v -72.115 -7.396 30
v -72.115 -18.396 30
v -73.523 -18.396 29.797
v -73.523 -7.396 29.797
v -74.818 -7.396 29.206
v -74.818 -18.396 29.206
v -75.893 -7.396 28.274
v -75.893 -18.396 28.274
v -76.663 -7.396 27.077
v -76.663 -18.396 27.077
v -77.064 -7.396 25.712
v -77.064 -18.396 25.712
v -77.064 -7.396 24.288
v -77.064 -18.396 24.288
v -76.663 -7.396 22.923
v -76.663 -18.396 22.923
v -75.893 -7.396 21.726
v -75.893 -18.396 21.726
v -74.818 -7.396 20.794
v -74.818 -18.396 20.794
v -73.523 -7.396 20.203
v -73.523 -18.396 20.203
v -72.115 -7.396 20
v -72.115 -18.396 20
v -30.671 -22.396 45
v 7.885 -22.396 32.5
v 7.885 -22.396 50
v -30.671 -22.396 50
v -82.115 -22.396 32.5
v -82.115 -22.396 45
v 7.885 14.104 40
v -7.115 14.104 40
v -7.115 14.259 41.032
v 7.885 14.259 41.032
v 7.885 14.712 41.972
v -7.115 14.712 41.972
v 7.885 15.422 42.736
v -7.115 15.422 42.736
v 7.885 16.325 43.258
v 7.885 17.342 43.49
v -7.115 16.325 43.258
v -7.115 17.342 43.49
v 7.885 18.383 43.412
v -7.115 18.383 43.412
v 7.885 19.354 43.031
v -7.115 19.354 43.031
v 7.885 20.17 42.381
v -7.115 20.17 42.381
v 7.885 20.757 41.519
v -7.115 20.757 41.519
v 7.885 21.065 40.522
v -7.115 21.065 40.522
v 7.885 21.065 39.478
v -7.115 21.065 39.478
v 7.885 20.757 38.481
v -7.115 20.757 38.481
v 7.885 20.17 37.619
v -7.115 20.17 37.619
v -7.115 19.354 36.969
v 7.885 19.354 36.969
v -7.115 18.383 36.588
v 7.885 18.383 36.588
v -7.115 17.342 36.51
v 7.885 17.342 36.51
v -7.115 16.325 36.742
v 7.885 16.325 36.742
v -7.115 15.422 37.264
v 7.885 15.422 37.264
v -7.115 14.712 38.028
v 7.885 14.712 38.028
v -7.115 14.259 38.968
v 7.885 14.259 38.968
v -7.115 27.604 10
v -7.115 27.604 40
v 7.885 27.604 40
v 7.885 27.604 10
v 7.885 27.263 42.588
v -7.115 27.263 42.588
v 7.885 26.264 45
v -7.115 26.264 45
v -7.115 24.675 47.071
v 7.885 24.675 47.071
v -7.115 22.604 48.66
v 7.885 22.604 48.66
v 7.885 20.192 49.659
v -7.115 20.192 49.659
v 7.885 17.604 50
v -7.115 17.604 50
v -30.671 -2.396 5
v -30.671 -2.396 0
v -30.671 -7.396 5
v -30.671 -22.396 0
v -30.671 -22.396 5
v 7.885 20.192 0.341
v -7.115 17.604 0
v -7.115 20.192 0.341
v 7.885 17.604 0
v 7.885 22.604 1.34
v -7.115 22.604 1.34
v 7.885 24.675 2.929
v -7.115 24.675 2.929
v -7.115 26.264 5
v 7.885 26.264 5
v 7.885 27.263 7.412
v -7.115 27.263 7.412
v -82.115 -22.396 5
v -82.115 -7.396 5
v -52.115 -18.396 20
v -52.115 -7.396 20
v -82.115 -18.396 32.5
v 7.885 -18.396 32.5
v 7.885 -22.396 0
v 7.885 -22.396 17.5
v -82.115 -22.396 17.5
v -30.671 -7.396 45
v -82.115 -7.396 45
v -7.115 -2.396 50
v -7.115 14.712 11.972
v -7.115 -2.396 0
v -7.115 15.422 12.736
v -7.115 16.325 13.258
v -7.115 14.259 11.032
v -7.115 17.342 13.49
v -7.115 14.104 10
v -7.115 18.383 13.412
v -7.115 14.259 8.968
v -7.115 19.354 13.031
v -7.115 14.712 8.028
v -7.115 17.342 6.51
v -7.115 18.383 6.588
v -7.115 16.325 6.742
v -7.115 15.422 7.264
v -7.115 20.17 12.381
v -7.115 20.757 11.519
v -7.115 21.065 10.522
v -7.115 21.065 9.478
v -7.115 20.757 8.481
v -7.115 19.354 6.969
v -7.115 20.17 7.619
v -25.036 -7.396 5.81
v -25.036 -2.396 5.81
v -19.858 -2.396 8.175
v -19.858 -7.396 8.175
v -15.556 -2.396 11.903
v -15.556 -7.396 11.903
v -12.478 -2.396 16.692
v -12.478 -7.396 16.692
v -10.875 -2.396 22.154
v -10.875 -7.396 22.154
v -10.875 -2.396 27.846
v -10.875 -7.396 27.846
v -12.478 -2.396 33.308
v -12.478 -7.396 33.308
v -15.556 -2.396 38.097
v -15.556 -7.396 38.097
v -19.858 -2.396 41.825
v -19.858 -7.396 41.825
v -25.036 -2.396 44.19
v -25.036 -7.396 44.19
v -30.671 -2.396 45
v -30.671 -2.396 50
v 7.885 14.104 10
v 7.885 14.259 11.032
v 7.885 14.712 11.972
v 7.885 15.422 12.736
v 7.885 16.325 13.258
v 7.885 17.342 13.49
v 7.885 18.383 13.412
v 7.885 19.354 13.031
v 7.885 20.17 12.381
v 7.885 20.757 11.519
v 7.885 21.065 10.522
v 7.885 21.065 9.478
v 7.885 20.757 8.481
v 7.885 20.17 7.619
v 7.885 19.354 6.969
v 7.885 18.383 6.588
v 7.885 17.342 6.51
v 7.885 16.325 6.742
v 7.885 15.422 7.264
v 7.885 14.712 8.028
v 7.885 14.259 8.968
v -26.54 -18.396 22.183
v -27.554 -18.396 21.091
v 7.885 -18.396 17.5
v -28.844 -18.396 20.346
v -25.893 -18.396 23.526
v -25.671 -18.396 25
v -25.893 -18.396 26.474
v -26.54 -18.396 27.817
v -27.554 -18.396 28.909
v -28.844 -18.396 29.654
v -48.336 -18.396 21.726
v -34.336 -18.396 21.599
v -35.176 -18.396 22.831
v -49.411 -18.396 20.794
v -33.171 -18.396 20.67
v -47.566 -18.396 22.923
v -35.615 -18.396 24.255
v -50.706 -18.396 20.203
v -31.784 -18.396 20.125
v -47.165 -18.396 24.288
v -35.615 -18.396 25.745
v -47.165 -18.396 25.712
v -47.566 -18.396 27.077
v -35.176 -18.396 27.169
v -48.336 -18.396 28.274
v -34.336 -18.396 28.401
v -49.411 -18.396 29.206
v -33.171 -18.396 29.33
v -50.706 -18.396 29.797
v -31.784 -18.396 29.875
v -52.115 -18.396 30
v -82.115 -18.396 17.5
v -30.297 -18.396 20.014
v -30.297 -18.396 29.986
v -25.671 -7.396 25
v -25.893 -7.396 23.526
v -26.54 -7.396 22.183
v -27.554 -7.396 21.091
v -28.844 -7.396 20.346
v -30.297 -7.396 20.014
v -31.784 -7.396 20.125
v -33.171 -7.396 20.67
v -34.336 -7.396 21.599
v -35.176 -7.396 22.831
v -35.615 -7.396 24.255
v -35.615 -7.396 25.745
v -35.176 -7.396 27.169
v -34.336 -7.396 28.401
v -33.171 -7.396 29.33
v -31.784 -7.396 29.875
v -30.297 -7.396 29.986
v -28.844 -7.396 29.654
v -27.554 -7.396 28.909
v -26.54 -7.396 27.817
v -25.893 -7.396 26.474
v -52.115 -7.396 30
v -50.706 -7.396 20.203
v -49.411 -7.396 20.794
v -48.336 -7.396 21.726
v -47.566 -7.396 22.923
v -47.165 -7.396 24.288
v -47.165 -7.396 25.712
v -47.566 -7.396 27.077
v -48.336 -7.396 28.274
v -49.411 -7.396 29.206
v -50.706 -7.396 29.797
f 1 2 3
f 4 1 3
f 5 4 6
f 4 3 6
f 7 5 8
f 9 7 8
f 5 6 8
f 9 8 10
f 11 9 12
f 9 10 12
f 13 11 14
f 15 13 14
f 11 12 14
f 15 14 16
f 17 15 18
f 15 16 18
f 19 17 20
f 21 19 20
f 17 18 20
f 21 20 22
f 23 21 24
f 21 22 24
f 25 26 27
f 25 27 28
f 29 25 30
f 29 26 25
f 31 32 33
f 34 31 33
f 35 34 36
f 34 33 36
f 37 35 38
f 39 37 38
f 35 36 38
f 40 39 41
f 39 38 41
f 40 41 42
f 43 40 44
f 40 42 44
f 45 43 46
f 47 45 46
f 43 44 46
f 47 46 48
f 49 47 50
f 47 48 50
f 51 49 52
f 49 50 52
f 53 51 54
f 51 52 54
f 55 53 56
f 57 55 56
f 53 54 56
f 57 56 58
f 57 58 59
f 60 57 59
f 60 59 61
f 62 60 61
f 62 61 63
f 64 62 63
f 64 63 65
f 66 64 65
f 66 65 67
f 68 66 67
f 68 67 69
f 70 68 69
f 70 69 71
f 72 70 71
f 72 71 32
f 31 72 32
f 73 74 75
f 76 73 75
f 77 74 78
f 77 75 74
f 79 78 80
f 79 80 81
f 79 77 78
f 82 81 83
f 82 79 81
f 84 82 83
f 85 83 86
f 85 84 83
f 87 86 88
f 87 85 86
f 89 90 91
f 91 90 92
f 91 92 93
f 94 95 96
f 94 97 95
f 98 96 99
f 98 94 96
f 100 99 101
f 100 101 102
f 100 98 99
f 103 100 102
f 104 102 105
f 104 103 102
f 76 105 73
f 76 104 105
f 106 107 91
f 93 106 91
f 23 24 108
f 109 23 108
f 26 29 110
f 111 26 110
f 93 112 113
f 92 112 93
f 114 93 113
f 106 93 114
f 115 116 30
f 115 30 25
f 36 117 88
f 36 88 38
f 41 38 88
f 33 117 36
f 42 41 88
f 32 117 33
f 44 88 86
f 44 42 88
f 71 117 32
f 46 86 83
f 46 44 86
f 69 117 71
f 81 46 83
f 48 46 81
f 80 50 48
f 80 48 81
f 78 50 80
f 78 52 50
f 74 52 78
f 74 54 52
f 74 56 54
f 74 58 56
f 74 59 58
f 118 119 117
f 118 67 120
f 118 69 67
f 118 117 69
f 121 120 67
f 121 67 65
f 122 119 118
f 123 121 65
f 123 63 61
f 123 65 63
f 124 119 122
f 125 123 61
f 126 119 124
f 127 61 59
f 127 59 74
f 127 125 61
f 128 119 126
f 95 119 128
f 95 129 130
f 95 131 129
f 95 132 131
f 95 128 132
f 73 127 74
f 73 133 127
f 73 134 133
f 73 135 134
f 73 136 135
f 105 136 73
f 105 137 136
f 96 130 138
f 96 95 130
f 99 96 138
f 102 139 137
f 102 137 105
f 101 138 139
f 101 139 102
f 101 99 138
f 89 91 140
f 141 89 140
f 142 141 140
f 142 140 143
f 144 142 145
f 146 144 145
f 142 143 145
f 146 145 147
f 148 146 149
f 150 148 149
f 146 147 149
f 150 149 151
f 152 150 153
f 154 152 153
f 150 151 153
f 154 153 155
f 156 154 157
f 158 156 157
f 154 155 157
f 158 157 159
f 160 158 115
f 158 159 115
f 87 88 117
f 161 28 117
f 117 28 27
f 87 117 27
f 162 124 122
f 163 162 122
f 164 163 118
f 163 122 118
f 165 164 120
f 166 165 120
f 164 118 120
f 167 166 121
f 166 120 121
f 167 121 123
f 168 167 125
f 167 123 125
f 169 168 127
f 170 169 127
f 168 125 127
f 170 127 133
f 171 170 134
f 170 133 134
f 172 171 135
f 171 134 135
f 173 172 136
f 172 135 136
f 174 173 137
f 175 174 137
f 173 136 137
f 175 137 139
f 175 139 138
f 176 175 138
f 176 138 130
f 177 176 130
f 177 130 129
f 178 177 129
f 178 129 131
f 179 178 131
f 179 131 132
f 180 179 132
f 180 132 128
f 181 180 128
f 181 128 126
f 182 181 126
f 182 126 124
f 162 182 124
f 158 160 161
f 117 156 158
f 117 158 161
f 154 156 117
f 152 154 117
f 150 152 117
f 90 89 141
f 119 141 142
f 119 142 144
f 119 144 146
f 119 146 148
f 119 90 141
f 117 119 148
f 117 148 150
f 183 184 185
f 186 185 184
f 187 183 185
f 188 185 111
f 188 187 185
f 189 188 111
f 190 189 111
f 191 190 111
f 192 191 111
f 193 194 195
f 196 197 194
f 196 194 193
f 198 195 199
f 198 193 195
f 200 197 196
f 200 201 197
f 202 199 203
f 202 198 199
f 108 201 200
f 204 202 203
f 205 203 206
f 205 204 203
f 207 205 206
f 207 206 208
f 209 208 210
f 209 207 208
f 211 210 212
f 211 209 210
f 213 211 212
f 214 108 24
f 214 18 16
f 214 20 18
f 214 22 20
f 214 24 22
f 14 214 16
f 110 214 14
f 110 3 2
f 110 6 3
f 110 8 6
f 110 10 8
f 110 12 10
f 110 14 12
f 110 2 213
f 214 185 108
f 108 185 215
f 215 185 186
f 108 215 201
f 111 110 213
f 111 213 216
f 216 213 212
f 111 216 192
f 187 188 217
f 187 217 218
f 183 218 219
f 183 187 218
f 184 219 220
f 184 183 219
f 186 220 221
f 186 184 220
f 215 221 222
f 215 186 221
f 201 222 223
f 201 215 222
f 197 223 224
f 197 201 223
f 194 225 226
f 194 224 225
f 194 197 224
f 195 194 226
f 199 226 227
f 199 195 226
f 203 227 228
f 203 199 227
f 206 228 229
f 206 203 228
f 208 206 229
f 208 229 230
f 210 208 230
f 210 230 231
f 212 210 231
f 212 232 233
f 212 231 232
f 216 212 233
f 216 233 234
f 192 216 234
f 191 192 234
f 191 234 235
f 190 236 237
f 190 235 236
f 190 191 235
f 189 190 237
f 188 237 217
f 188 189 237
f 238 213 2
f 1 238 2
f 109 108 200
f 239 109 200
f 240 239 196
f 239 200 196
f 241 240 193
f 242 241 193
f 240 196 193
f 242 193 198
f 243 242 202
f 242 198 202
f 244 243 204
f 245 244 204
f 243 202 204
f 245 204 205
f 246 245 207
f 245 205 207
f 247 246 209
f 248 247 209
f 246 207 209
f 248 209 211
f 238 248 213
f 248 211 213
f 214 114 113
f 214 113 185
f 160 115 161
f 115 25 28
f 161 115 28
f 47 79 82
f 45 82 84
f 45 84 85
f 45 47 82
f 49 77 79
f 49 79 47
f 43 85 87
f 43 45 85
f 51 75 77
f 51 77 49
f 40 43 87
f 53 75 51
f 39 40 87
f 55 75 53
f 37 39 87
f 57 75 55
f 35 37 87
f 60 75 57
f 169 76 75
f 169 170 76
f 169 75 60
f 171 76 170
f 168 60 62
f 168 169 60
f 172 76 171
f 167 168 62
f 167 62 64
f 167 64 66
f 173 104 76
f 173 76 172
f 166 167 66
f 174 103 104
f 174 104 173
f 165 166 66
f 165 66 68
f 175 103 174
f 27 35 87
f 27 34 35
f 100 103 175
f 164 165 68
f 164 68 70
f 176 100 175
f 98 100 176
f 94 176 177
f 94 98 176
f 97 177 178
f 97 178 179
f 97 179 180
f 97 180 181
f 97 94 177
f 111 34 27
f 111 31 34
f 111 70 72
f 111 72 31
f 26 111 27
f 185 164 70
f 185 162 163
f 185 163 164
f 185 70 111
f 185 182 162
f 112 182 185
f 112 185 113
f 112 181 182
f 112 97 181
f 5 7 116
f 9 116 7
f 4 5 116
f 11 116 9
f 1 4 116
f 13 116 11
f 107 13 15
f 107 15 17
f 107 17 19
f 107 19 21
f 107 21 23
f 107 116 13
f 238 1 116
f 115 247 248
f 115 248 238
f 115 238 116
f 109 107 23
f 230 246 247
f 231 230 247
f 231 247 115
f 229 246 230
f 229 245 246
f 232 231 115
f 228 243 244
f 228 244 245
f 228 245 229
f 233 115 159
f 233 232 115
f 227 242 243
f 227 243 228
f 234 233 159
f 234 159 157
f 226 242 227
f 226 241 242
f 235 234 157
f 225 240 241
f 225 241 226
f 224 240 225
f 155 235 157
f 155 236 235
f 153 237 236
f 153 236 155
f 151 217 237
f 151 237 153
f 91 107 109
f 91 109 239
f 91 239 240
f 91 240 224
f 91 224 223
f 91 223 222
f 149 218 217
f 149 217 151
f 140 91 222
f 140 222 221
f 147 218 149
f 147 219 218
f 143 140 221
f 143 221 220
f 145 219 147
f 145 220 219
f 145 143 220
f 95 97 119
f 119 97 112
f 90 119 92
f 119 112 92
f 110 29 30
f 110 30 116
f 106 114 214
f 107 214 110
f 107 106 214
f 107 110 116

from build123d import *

# Parameters (mm, degrees)
Y_KSEKLIK_EKSTR_ZYON2_DEPTH = 50
Y_KSEKLIK_EKSTR_ZYON3_DEPTH = 5
IZIM3_W                     = 51.443502464
IZIM3_H                     = 5
KES_EKSTR_ZYON1_DEPTH       = 15
IZIM4_W                     = 15
IZIM4_H                     = 4
KES_EKSTR_ZYON2_DEPTH       = 90
RADYUS2_R                   = 10
RADYUS3_R                   = 10
KES_EKSTR_ZYON3_REACH       = 96.271
IZIM5_R                     = 3.5
KES_EKSTR_ZYON4_DEPTH       = 103.312244464
KES_EKSTR_ZYON4_DEPTH_BACK  = 103.312244464
IZIM6_R                     = 5


with BuildPart() as part:
    # Çizim1 → Yükseklik-Ekstrüzyon2 (new body)
    with BuildSketch(Plane.XY):
        Polygon((-7.114525921, 27.60391198), (7.885474079, 27.60391198), (7.885474079, -22.39608802), (-82.114525921, -22.39608802), (-82.114525921, -7.39608802), (-7.114525921, -7.39608802), align=None)
    extrude(amount=Y_KSEKLIK_EKSTR_ZYON2_DEPTH)

    # Çizim2 → Yükseklik-Ekstrüzyon3 (add)
    with BuildSketch(Plane(origin=(0, -7.39608802, 0), x_dir=(1, 0, 0), z_dir=(0, 1, 0))):
        with BuildLine():
            Line((-7.114525921, 0), (-30.671023457, 0))
            Line((-30.671023457, 0), (-30.671023457, -5))
            ThreePointArc((-30.671023457, -5), (-10.671023457, -25), (-30.671023457, -45))
            Line((-30.671023457, -45), (-30.671023457, -50))
            Line((-30.671023457, -50), (-7.114525921, -50))
            Line((-7.114525921, -50), (-7.114525921, 0))
        make_face()
    extrude(amount=Y_KSEKLIK_EKSTR_ZYON3_DEPTH)

    # Çizim3 → Kes-Ekstrüzyon1 (cut)
    with BuildSketch(Plane(origin=(0, -7.39608802, 0), x_dir=(1, 0, 0), z_dir=(0, 1, 0))):
        with Locations((-56.392774689, -2.5)):
            Rectangle(IZIM3_W, IZIM3_H)
        with Locations((-56.392774689, -47.5)):
            Rectangle(IZIM3_W, IZIM3_H)
    extrude(amount=-KES_EKSTR_ZYON1_DEPTH, mode=Mode.SUBTRACT)

    # Çizim4 → Kes-Ekstrüzyon2 (cut)
    with BuildSketch(Plane.ZY.offset(82.114525921)):
        with Locations((25, -20.39608802)):
            Rectangle(IZIM4_W, IZIM4_H)
    extrude(amount=-KES_EKSTR_ZYON2_DEPTH, mode=Mode.SUBTRACT)

    # Radyus2
    radyus2_edges = [part.edges().sort_by_distance(p)[0] for p in [
        (0.385474079, 27.60391198, 0),
    ]]
    fillet(radyus2_edges, radius=RADYUS2_R)

    # Radyus3
    radyus3_edges = [part.edges().sort_by_distance(p)[0] for p in [
        (0.385474079, 27.60391198, 50),
    ]]
    fillet(radyus3_edges, radius=RADYUS3_R)

    # Çizim5 → Kes-Ekstrüzyon3 (cut, up to next)
    with BuildSketch(Plane.ZY.offset(7.114525921), mode=Mode.PRIVATE) as kes_ekstr_zyon3_sk1:
        with Locations(Location((10, 17.60391198, 0), (0, 0, 270))):
            Circle(IZIM5_R)
    kes_ekstr_zyon3_tool1 = extrude(kes_ekstr_zyon3_sk1.sketch, amount=-KES_EKSTR_ZYON3_REACH, mode=Mode.PRIVATE) & part.part
    # Çizim5 → Kes-Ekstrüzyon3 (cut, up to next)
    with BuildSketch(Plane.ZY.offset(7.114525921), mode=Mode.PRIVATE) as kes_ekstr_zyon3_sk2:
        with Locations(Location((40, 17.60391198, 0), (0, 0, 270))):
            Circle(IZIM5_R)
    kes_ekstr_zyon3_tool2 = extrude(kes_ekstr_zyon3_sk2.sketch, amount=-KES_EKSTR_ZYON3_REACH, mode=Mode.PRIVATE) & part.part
    add(kes_ekstr_zyon3_tool1.solids().sort_by_distance((-7.114526, 17.603912, 10))[0], mode=Mode.SUBTRACT)
    add(kes_ekstr_zyon3_tool2.solids().sort_by_distance((-7.114526, 17.603912, 40))[0], mode=Mode.SUBTRACT)

    # Çizim6 → Kes-Ekstrüzyon4 (cut, two sides: drawn at the far end of the back side and taken through both)
    with BuildSketch(Plane(origin=(0, -7.39608802, 0), x_dir=(1, 0, 0), z_dir=(0, 1, 0)).offset(-KES_EKSTR_ZYON4_DEPTH_BACK)):
        with Locations((-30.671023457, -25)):
            Circle(IZIM6_R)
        with BuildLine():
            Line((-72.114525921, -20), (-52.114525921, -20))
            ThreePointArc((-52.114525921, -20), (-47.114525921, -25), (-52.114525921, -30))
            Line((-52.114525921, -30), (-72.114525921, -30))
            ThreePointArc((-72.114525921, -30), (-77.114525921, -25), (-72.114525921, -20))
        make_face()
    extrude(amount=KES_EKSTR_ZYON4_DEPTH + KES_EKSTR_ZYON4_DEPTH_BACK, mode=Mode.SUBTRACT)


solid = part.part
